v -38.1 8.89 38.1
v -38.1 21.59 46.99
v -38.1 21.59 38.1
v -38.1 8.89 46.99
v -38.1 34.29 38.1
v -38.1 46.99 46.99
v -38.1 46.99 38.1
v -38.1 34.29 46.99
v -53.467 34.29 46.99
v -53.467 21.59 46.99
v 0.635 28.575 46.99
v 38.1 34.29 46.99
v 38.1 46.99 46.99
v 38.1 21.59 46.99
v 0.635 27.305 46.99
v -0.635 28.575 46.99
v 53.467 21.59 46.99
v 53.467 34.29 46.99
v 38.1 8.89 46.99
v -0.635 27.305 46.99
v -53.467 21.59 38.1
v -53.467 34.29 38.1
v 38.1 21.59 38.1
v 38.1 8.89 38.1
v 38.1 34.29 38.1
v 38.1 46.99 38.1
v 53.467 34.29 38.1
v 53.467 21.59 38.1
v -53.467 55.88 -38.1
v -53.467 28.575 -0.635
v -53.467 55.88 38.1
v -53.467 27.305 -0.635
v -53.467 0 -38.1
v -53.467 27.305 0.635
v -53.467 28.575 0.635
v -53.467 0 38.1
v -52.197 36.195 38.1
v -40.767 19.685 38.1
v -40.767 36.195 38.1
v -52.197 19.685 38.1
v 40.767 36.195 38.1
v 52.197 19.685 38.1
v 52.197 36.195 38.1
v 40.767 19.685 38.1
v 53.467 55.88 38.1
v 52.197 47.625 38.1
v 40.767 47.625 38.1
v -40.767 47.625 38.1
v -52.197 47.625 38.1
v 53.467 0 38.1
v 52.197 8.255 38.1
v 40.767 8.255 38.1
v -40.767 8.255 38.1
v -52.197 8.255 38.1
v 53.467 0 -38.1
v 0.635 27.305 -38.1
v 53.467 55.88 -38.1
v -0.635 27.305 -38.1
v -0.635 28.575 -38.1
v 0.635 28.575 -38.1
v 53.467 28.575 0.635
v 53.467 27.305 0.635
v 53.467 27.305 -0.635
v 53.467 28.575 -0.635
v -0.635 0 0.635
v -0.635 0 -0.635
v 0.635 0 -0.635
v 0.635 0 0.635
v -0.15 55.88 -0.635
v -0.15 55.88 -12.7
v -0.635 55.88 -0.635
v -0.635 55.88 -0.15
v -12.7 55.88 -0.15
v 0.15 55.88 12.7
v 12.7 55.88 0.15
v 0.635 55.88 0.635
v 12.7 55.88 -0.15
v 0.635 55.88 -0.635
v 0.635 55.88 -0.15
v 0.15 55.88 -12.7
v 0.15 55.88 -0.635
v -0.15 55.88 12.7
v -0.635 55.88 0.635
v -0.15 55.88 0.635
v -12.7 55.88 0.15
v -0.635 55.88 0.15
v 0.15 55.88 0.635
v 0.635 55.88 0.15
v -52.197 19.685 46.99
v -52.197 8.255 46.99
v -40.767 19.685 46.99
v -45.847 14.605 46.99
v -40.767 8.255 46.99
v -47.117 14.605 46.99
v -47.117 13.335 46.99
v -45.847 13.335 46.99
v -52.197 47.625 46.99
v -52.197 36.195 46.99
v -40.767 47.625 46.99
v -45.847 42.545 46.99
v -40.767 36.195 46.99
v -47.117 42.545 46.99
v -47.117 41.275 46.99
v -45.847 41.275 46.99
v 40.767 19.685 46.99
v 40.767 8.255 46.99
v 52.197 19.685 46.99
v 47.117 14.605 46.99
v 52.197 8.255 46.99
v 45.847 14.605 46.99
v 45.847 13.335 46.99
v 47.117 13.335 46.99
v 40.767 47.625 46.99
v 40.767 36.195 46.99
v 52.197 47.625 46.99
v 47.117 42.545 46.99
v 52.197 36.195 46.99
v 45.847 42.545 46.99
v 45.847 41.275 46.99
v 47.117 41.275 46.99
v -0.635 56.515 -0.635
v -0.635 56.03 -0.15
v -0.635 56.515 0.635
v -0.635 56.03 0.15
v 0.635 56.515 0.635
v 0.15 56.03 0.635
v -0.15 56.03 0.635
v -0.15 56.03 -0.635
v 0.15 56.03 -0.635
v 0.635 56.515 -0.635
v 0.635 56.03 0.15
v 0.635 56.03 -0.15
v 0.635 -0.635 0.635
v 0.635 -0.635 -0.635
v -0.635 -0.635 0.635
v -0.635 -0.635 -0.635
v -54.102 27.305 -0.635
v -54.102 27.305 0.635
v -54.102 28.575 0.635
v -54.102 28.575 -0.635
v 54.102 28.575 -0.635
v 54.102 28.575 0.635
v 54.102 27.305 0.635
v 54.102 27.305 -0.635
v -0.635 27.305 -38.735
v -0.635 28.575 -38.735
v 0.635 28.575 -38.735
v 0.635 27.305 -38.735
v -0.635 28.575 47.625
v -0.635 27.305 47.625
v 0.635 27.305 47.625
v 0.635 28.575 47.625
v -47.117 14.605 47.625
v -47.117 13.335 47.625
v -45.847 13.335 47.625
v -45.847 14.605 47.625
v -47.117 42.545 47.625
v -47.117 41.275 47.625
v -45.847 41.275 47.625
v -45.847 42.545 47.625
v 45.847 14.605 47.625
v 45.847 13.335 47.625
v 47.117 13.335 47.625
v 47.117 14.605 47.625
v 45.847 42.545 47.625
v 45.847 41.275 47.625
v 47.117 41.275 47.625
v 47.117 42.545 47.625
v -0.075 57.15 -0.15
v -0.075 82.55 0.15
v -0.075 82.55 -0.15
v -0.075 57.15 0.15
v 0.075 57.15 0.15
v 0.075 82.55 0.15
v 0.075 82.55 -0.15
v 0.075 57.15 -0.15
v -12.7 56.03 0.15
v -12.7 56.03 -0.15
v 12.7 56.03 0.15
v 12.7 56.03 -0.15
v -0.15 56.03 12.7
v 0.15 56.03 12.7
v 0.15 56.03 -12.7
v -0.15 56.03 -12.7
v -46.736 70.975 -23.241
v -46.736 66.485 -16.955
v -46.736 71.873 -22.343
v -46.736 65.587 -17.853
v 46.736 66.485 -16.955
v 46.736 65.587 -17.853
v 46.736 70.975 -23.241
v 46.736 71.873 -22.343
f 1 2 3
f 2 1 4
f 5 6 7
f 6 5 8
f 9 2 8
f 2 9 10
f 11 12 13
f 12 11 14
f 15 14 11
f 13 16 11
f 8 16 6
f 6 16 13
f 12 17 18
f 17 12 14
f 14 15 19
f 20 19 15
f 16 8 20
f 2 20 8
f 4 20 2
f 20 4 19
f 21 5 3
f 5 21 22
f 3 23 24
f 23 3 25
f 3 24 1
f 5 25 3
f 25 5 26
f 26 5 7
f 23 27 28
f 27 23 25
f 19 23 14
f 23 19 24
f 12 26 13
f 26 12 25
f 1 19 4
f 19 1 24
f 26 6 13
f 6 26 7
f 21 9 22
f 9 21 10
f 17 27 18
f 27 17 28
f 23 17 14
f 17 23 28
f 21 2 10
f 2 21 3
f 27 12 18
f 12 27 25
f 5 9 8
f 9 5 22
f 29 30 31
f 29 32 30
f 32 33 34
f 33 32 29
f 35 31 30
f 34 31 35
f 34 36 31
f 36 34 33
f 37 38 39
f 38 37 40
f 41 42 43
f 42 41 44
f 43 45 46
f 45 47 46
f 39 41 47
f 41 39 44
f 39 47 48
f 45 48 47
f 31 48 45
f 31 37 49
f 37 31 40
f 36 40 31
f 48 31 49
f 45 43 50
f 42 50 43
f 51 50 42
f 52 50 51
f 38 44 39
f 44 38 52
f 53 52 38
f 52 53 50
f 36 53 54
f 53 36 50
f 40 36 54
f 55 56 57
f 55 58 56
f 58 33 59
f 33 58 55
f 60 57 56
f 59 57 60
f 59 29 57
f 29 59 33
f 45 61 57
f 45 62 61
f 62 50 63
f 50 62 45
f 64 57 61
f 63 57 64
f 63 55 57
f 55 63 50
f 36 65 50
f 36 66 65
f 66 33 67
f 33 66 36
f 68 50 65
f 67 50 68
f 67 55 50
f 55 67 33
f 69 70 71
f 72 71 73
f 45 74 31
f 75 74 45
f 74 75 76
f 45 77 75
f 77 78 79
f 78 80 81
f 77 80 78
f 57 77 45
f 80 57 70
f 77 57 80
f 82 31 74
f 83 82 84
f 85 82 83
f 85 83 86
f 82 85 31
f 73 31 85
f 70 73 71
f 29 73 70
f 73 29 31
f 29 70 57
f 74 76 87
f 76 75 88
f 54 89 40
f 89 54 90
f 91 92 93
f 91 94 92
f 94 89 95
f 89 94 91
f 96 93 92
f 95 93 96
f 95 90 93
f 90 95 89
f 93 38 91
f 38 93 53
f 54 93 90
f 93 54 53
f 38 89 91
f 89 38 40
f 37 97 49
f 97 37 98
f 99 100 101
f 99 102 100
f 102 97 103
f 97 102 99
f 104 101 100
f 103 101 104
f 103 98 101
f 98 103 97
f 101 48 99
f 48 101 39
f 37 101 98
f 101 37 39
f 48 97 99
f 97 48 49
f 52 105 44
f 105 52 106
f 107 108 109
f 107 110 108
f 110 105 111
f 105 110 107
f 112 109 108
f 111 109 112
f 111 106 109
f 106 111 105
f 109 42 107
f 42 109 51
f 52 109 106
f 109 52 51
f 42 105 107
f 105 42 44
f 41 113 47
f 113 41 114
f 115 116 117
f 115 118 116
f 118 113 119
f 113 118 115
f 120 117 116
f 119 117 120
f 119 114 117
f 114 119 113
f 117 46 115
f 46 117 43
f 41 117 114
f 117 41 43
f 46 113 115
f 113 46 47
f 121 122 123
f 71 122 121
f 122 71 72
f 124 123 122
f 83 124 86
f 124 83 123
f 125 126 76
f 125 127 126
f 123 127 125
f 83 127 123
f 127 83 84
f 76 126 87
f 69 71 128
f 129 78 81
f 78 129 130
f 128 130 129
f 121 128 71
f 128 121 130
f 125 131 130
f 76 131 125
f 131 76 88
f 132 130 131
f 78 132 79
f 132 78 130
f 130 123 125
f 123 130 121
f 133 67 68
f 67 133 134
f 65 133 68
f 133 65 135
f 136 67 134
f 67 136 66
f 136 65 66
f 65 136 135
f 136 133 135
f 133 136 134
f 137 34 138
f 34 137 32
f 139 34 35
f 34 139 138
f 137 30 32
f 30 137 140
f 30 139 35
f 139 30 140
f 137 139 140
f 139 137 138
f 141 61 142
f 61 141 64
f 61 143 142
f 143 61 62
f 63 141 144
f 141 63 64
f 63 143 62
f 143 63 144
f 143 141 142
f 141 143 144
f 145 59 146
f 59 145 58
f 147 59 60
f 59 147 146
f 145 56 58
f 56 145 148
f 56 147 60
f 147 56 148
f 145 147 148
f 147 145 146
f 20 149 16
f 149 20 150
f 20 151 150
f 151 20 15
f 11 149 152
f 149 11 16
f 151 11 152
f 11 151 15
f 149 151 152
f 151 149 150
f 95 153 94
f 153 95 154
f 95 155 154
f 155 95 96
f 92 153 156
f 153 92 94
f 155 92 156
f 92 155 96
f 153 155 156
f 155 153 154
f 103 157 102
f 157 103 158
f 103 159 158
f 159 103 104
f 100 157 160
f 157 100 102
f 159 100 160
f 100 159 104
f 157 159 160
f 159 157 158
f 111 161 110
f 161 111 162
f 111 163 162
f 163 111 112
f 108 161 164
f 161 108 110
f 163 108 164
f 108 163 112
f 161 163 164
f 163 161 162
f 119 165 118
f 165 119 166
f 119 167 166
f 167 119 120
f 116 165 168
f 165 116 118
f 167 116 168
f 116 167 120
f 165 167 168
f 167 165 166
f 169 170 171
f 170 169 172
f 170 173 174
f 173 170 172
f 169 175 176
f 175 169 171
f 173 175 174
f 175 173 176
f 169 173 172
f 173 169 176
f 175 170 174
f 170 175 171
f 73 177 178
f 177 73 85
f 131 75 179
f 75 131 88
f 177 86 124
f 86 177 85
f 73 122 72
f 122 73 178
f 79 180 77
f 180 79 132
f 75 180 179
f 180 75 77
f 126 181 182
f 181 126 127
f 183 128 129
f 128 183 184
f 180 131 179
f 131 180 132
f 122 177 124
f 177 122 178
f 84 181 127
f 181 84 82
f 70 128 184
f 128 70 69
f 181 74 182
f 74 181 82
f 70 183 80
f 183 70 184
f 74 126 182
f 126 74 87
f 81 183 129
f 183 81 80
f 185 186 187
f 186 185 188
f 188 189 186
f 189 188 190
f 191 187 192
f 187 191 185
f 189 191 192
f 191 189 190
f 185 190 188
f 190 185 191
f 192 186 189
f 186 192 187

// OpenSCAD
include <../mo/mo.scad>

MoBattery12V7AhLiFePO4_BodyHeight = 3.0 * in;
MoBattery12V7AhLiFePO4_Width = 4.21 * in;
MoBattery12V7AhLiFePO4_Depth= 2.2 * in;

MoBattery12V7AhLiFePO4_TopHeight = 4.2 * in;
MoBattery12V7AhLiFePO4_TopWidth =  3.0 * in;
MoBattery12V7AhLiFePO4_TopHeight =  0.35 * in;
MoBattery12V7AhLiFePO4_TopDepth =  1.5 * in;

MoBattery12V7AhLiFePO4_TopSepWidth =  MoBattery12V7AhLiFePO4_Width;
MoBattery12V7AhLiFePO4_TopSepHeight =  MoBattery12V7AhLiFePO4_TopHeight;
MoBattery12V7AhLiFePO4_TopSepDepth =  0.5 * in;

MoBattery12V7AhLiFePO4_TerminalWidth =  0.45 * in;
MoBattery12V7AhLiFePO4_TerminalHeight =  MoBattery12V7AhLiFePO4_TopHeight;
MoBattery12V7AhLiFePO4_TerminalDepth =  0.45 * in;
MoBattery12V7AhLiFePO4_TerminalXOffset =  MoBattery12V7AhLiFePO4_Width / 2 - 0.275 * in;
MoBattery12V7AhLiFePO4_TerminalYOffset =  0.55 * in;


MoBattery12V7AhLiFePO4_Depth = 2.2 * in;

MoBattery12V7AhLiFePO4_Height = MoBattery12V7AhLiFePO4_BodyHeight + MoBattery12V7AhLiFePO4_TopHeight;

MoBattery12V7AhLiFePO4_BodyColor = [ 0.25, 0.25, 0.25 ];
MoBattery12V7AhLiFePO4_TopColor = [ 0.25, 0.25, 0.25 ];
MoBattery12V7AhLiFePO4_TerminalColor = Aluminum;

positions = [
  [ [ 0, 0, 0 ], [ 0, 0, 1 ], 0 ],
  [ [ 0, MoBattery12V7AhLiFePO4_Depth, 0 ], [ 0, 0, 1 ], 180 ],
  [ [ MoBattery12V7AhLiFePO4_Width/2, MoBattery12V7AhLiFePO4_Depth/2, 0 ], [ 0, 0, 1 ], 90 ],
  [ [ -MoBattery12V7AhLiFePO4_Width/2, MoBattery12V7AhLiFePO4_Depth/2, 0 ], [ 0, 0, 1 ], -90 ],
  [ [ 0, MoBattery12V7AhLiFePO4_Depth/2, -MoBattery12V7AhLiFePO4_BodyHeight/2 ], [ 1, 0, 0 ], 90 ],
  [ [ 0, MoBattery12V7AhLiFePO4_Depth/2, MoBattery12V7AhLiFePO4_BodyHeight/2 + MoBattery12V7AhLiFePO4_TopHeight], [ 1, 0, 0 ], -90 ],

  [ [ MoBattery12V7AhLiFePO4_TerminalXOffset, MoBattery12V7AhLiFePO4_Depth/2 + MoBattery12V7AhLiFePO4_TerminalYOffset, MoBattery12V7AhLiFePO4_BodyHeight/2 + MoBattery12V7AhLiFePO4_TopHeight], [ 1, 0, 0 ], -90 ],
  [ [ MoBattery12V7AhLiFePO4_TerminalXOffset, MoBattery12V7AhLiFePO4_Depth/2 - MoBattery12V7AhLiFePO4_TerminalYOffset, MoBattery12V7AhLiFePO4_BodyHeight/2 + MoBattery12V7AhLiFePO4_TopHeight], [ 1, 0, 0 ], -90 ],
  [ [ -MoBattery12V7AhLiFePO4_TerminalXOffset, MoBattery12V7AhLiFePO4_Depth/2 + MoBattery12V7AhLiFePO4_TerminalYOffset, MoBattery12V7AhLiFePO4_BodyHeight/2 + MoBattery12V7AhLiFePO4_TopHeight], [ 1, 0, 0 ], -90 ],
  [ [ -MoBattery12V7AhLiFePO4_TerminalXOffset, MoBattery12V7AhLiFePO4_Depth/2 - MoBattery12V7AhLiFePO4_TerminalYOffset, MoBattery12V7AhLiFePO4_BodyHeight/2 + MoBattery12V7AhLiFePO4_TopHeight], [ 1, 0, 0 ], -90 ],

//  [ [ -MoBattery12V7AhLiFePO4_WireSpacing / 2, MoBattery12V7AhLiFePO4_Depth/2, MoBattery12V7AhLiFePO4_BodyHeight/2 + MoBattery12V7AhLiFePO4_TopHeight], [ 1, 0, 0 ], -90 ],
//  [ [ MoBattery12V7AhLiFePO4_WireSpacing / 2, MoBattery12V7AhLiFePO4_Depth/2, MoBattery12V7AhLiFePO4_BodyHeight/2 + MoBattery12V7AhLiFePO4_TopHeight], [ 1, 0, 0 ], -90 ],
];

module moBattery12V7AhLiFePO4( p = 0, info = false ) {
    moPresent( positions, p, info ) {
        translate( [ 0, MoBattery12V7AhLiFePO4_Depth/2, 0 ] ) {
          union() {
            color( MoBattery12V7AhLiFePO4_BodyColor ) {
              cube( [ MoBattery12V7AhLiFePO4_Width, MoBattery12V7AhLiFePO4_Depth,  MoBattery12V7AhLiFePO4_BodyHeight ], center = true );
            }
            translate( [ 0, 0, MoBattery12V7AhLiFePO4_Height/2] ) {
              color( MoBattery12V7AhLiFePO4_TopColor ) {
                union() {
                  cube( [ MoBattery12V7AhLiFePO4_TopWidth, MoBattery12V7AhLiFePO4_TopDepth,  MoBattery12V7AhLiFePO4_TopHeight ], center = true );
                  cube( [ MoBattery12V7AhLiFePO4_TopSepWidth, MoBattery12V7AhLiFePO4_TopSepDepth,  MoBattery12V7AhLiFePO4_TopSepHeight ], center = true );
                }
              }
            }
            translate( [ MoBattery12V7AhLiFePO4_TerminalXOffset, MoBattery12V7AhLiFePO4_TerminalYOffset, MoBattery12V7AhLiFePO4_Height/2 ] ) {
              color( MoBattery12V7AhLiFePO4_TerminalColor ) {
                  cube( [ MoBattery12V7AhLiFePO4_TerminalWidth, MoBattery12V7AhLiFePO4_TerminalDepth,  MoBattery12V7AhLiFePO4_TerminalHeight ], center = true );
              }
            }
            translate( [ MoBattery12V7AhLiFePO4_TerminalXOffset, -MoBattery12V7AhLiFePO4_TerminalYOffset, MoBattery12V7AhLiFePO4_Height/2 ] ) {
              color( MoBattery12V7AhLiFePO4_TerminalColor ) {
                  cube( [ MoBattery12V7AhLiFePO4_TerminalWidth, MoBattery12V7AhLiFePO4_TerminalDepth,  MoBattery12V7AhLiFePO4_TerminalHeight ], center = true );
              }
            }
            translate( [ -MoBattery12V7AhLiFePO4_TerminalXOffset, MoBattery12V7AhLiFePO4_TerminalYOffset, MoBattery12V7AhLiFePO4_Height/2 ] ) {
              color( MoBattery12V7AhLiFePO4_TerminalColor ) {
                  cube( [ MoBattery12V7AhLiFePO4_TerminalWidth, MoBattery12V7AhLiFePO4_TerminalDepth,  MoBattery12V7AhLiFePO4_TerminalHeight ], center = true );
              }
            }
            translate( [ -MoBattery12V7AhLiFePO4_TerminalXOffset, -MoBattery12V7AhLiFePO4_TerminalYOffset, MoBattery12V7AhLiFePO4_Height/2 ] ) {
              color( MoBattery12V7AhLiFePO4_TerminalColor ) {
                  cube( [ MoBattery12V7AhLiFePO4_TerminalWidth, MoBattery12V7AhLiFePO4_TerminalDepth,  MoBattery12V7AhLiFePO4_TerminalHeight ], center = true );
              }
            }
          }
        }
    }
}


function moBattery12V7AhLiFePO4Position( p = 0 ) = positions[ p ];

moMoveOriginTo( moBattery12V7AhLiFePO4Position( 1 ) ) {
  moBattery12V7AhLiFePO4( 0, info = true, $name = true );
}
